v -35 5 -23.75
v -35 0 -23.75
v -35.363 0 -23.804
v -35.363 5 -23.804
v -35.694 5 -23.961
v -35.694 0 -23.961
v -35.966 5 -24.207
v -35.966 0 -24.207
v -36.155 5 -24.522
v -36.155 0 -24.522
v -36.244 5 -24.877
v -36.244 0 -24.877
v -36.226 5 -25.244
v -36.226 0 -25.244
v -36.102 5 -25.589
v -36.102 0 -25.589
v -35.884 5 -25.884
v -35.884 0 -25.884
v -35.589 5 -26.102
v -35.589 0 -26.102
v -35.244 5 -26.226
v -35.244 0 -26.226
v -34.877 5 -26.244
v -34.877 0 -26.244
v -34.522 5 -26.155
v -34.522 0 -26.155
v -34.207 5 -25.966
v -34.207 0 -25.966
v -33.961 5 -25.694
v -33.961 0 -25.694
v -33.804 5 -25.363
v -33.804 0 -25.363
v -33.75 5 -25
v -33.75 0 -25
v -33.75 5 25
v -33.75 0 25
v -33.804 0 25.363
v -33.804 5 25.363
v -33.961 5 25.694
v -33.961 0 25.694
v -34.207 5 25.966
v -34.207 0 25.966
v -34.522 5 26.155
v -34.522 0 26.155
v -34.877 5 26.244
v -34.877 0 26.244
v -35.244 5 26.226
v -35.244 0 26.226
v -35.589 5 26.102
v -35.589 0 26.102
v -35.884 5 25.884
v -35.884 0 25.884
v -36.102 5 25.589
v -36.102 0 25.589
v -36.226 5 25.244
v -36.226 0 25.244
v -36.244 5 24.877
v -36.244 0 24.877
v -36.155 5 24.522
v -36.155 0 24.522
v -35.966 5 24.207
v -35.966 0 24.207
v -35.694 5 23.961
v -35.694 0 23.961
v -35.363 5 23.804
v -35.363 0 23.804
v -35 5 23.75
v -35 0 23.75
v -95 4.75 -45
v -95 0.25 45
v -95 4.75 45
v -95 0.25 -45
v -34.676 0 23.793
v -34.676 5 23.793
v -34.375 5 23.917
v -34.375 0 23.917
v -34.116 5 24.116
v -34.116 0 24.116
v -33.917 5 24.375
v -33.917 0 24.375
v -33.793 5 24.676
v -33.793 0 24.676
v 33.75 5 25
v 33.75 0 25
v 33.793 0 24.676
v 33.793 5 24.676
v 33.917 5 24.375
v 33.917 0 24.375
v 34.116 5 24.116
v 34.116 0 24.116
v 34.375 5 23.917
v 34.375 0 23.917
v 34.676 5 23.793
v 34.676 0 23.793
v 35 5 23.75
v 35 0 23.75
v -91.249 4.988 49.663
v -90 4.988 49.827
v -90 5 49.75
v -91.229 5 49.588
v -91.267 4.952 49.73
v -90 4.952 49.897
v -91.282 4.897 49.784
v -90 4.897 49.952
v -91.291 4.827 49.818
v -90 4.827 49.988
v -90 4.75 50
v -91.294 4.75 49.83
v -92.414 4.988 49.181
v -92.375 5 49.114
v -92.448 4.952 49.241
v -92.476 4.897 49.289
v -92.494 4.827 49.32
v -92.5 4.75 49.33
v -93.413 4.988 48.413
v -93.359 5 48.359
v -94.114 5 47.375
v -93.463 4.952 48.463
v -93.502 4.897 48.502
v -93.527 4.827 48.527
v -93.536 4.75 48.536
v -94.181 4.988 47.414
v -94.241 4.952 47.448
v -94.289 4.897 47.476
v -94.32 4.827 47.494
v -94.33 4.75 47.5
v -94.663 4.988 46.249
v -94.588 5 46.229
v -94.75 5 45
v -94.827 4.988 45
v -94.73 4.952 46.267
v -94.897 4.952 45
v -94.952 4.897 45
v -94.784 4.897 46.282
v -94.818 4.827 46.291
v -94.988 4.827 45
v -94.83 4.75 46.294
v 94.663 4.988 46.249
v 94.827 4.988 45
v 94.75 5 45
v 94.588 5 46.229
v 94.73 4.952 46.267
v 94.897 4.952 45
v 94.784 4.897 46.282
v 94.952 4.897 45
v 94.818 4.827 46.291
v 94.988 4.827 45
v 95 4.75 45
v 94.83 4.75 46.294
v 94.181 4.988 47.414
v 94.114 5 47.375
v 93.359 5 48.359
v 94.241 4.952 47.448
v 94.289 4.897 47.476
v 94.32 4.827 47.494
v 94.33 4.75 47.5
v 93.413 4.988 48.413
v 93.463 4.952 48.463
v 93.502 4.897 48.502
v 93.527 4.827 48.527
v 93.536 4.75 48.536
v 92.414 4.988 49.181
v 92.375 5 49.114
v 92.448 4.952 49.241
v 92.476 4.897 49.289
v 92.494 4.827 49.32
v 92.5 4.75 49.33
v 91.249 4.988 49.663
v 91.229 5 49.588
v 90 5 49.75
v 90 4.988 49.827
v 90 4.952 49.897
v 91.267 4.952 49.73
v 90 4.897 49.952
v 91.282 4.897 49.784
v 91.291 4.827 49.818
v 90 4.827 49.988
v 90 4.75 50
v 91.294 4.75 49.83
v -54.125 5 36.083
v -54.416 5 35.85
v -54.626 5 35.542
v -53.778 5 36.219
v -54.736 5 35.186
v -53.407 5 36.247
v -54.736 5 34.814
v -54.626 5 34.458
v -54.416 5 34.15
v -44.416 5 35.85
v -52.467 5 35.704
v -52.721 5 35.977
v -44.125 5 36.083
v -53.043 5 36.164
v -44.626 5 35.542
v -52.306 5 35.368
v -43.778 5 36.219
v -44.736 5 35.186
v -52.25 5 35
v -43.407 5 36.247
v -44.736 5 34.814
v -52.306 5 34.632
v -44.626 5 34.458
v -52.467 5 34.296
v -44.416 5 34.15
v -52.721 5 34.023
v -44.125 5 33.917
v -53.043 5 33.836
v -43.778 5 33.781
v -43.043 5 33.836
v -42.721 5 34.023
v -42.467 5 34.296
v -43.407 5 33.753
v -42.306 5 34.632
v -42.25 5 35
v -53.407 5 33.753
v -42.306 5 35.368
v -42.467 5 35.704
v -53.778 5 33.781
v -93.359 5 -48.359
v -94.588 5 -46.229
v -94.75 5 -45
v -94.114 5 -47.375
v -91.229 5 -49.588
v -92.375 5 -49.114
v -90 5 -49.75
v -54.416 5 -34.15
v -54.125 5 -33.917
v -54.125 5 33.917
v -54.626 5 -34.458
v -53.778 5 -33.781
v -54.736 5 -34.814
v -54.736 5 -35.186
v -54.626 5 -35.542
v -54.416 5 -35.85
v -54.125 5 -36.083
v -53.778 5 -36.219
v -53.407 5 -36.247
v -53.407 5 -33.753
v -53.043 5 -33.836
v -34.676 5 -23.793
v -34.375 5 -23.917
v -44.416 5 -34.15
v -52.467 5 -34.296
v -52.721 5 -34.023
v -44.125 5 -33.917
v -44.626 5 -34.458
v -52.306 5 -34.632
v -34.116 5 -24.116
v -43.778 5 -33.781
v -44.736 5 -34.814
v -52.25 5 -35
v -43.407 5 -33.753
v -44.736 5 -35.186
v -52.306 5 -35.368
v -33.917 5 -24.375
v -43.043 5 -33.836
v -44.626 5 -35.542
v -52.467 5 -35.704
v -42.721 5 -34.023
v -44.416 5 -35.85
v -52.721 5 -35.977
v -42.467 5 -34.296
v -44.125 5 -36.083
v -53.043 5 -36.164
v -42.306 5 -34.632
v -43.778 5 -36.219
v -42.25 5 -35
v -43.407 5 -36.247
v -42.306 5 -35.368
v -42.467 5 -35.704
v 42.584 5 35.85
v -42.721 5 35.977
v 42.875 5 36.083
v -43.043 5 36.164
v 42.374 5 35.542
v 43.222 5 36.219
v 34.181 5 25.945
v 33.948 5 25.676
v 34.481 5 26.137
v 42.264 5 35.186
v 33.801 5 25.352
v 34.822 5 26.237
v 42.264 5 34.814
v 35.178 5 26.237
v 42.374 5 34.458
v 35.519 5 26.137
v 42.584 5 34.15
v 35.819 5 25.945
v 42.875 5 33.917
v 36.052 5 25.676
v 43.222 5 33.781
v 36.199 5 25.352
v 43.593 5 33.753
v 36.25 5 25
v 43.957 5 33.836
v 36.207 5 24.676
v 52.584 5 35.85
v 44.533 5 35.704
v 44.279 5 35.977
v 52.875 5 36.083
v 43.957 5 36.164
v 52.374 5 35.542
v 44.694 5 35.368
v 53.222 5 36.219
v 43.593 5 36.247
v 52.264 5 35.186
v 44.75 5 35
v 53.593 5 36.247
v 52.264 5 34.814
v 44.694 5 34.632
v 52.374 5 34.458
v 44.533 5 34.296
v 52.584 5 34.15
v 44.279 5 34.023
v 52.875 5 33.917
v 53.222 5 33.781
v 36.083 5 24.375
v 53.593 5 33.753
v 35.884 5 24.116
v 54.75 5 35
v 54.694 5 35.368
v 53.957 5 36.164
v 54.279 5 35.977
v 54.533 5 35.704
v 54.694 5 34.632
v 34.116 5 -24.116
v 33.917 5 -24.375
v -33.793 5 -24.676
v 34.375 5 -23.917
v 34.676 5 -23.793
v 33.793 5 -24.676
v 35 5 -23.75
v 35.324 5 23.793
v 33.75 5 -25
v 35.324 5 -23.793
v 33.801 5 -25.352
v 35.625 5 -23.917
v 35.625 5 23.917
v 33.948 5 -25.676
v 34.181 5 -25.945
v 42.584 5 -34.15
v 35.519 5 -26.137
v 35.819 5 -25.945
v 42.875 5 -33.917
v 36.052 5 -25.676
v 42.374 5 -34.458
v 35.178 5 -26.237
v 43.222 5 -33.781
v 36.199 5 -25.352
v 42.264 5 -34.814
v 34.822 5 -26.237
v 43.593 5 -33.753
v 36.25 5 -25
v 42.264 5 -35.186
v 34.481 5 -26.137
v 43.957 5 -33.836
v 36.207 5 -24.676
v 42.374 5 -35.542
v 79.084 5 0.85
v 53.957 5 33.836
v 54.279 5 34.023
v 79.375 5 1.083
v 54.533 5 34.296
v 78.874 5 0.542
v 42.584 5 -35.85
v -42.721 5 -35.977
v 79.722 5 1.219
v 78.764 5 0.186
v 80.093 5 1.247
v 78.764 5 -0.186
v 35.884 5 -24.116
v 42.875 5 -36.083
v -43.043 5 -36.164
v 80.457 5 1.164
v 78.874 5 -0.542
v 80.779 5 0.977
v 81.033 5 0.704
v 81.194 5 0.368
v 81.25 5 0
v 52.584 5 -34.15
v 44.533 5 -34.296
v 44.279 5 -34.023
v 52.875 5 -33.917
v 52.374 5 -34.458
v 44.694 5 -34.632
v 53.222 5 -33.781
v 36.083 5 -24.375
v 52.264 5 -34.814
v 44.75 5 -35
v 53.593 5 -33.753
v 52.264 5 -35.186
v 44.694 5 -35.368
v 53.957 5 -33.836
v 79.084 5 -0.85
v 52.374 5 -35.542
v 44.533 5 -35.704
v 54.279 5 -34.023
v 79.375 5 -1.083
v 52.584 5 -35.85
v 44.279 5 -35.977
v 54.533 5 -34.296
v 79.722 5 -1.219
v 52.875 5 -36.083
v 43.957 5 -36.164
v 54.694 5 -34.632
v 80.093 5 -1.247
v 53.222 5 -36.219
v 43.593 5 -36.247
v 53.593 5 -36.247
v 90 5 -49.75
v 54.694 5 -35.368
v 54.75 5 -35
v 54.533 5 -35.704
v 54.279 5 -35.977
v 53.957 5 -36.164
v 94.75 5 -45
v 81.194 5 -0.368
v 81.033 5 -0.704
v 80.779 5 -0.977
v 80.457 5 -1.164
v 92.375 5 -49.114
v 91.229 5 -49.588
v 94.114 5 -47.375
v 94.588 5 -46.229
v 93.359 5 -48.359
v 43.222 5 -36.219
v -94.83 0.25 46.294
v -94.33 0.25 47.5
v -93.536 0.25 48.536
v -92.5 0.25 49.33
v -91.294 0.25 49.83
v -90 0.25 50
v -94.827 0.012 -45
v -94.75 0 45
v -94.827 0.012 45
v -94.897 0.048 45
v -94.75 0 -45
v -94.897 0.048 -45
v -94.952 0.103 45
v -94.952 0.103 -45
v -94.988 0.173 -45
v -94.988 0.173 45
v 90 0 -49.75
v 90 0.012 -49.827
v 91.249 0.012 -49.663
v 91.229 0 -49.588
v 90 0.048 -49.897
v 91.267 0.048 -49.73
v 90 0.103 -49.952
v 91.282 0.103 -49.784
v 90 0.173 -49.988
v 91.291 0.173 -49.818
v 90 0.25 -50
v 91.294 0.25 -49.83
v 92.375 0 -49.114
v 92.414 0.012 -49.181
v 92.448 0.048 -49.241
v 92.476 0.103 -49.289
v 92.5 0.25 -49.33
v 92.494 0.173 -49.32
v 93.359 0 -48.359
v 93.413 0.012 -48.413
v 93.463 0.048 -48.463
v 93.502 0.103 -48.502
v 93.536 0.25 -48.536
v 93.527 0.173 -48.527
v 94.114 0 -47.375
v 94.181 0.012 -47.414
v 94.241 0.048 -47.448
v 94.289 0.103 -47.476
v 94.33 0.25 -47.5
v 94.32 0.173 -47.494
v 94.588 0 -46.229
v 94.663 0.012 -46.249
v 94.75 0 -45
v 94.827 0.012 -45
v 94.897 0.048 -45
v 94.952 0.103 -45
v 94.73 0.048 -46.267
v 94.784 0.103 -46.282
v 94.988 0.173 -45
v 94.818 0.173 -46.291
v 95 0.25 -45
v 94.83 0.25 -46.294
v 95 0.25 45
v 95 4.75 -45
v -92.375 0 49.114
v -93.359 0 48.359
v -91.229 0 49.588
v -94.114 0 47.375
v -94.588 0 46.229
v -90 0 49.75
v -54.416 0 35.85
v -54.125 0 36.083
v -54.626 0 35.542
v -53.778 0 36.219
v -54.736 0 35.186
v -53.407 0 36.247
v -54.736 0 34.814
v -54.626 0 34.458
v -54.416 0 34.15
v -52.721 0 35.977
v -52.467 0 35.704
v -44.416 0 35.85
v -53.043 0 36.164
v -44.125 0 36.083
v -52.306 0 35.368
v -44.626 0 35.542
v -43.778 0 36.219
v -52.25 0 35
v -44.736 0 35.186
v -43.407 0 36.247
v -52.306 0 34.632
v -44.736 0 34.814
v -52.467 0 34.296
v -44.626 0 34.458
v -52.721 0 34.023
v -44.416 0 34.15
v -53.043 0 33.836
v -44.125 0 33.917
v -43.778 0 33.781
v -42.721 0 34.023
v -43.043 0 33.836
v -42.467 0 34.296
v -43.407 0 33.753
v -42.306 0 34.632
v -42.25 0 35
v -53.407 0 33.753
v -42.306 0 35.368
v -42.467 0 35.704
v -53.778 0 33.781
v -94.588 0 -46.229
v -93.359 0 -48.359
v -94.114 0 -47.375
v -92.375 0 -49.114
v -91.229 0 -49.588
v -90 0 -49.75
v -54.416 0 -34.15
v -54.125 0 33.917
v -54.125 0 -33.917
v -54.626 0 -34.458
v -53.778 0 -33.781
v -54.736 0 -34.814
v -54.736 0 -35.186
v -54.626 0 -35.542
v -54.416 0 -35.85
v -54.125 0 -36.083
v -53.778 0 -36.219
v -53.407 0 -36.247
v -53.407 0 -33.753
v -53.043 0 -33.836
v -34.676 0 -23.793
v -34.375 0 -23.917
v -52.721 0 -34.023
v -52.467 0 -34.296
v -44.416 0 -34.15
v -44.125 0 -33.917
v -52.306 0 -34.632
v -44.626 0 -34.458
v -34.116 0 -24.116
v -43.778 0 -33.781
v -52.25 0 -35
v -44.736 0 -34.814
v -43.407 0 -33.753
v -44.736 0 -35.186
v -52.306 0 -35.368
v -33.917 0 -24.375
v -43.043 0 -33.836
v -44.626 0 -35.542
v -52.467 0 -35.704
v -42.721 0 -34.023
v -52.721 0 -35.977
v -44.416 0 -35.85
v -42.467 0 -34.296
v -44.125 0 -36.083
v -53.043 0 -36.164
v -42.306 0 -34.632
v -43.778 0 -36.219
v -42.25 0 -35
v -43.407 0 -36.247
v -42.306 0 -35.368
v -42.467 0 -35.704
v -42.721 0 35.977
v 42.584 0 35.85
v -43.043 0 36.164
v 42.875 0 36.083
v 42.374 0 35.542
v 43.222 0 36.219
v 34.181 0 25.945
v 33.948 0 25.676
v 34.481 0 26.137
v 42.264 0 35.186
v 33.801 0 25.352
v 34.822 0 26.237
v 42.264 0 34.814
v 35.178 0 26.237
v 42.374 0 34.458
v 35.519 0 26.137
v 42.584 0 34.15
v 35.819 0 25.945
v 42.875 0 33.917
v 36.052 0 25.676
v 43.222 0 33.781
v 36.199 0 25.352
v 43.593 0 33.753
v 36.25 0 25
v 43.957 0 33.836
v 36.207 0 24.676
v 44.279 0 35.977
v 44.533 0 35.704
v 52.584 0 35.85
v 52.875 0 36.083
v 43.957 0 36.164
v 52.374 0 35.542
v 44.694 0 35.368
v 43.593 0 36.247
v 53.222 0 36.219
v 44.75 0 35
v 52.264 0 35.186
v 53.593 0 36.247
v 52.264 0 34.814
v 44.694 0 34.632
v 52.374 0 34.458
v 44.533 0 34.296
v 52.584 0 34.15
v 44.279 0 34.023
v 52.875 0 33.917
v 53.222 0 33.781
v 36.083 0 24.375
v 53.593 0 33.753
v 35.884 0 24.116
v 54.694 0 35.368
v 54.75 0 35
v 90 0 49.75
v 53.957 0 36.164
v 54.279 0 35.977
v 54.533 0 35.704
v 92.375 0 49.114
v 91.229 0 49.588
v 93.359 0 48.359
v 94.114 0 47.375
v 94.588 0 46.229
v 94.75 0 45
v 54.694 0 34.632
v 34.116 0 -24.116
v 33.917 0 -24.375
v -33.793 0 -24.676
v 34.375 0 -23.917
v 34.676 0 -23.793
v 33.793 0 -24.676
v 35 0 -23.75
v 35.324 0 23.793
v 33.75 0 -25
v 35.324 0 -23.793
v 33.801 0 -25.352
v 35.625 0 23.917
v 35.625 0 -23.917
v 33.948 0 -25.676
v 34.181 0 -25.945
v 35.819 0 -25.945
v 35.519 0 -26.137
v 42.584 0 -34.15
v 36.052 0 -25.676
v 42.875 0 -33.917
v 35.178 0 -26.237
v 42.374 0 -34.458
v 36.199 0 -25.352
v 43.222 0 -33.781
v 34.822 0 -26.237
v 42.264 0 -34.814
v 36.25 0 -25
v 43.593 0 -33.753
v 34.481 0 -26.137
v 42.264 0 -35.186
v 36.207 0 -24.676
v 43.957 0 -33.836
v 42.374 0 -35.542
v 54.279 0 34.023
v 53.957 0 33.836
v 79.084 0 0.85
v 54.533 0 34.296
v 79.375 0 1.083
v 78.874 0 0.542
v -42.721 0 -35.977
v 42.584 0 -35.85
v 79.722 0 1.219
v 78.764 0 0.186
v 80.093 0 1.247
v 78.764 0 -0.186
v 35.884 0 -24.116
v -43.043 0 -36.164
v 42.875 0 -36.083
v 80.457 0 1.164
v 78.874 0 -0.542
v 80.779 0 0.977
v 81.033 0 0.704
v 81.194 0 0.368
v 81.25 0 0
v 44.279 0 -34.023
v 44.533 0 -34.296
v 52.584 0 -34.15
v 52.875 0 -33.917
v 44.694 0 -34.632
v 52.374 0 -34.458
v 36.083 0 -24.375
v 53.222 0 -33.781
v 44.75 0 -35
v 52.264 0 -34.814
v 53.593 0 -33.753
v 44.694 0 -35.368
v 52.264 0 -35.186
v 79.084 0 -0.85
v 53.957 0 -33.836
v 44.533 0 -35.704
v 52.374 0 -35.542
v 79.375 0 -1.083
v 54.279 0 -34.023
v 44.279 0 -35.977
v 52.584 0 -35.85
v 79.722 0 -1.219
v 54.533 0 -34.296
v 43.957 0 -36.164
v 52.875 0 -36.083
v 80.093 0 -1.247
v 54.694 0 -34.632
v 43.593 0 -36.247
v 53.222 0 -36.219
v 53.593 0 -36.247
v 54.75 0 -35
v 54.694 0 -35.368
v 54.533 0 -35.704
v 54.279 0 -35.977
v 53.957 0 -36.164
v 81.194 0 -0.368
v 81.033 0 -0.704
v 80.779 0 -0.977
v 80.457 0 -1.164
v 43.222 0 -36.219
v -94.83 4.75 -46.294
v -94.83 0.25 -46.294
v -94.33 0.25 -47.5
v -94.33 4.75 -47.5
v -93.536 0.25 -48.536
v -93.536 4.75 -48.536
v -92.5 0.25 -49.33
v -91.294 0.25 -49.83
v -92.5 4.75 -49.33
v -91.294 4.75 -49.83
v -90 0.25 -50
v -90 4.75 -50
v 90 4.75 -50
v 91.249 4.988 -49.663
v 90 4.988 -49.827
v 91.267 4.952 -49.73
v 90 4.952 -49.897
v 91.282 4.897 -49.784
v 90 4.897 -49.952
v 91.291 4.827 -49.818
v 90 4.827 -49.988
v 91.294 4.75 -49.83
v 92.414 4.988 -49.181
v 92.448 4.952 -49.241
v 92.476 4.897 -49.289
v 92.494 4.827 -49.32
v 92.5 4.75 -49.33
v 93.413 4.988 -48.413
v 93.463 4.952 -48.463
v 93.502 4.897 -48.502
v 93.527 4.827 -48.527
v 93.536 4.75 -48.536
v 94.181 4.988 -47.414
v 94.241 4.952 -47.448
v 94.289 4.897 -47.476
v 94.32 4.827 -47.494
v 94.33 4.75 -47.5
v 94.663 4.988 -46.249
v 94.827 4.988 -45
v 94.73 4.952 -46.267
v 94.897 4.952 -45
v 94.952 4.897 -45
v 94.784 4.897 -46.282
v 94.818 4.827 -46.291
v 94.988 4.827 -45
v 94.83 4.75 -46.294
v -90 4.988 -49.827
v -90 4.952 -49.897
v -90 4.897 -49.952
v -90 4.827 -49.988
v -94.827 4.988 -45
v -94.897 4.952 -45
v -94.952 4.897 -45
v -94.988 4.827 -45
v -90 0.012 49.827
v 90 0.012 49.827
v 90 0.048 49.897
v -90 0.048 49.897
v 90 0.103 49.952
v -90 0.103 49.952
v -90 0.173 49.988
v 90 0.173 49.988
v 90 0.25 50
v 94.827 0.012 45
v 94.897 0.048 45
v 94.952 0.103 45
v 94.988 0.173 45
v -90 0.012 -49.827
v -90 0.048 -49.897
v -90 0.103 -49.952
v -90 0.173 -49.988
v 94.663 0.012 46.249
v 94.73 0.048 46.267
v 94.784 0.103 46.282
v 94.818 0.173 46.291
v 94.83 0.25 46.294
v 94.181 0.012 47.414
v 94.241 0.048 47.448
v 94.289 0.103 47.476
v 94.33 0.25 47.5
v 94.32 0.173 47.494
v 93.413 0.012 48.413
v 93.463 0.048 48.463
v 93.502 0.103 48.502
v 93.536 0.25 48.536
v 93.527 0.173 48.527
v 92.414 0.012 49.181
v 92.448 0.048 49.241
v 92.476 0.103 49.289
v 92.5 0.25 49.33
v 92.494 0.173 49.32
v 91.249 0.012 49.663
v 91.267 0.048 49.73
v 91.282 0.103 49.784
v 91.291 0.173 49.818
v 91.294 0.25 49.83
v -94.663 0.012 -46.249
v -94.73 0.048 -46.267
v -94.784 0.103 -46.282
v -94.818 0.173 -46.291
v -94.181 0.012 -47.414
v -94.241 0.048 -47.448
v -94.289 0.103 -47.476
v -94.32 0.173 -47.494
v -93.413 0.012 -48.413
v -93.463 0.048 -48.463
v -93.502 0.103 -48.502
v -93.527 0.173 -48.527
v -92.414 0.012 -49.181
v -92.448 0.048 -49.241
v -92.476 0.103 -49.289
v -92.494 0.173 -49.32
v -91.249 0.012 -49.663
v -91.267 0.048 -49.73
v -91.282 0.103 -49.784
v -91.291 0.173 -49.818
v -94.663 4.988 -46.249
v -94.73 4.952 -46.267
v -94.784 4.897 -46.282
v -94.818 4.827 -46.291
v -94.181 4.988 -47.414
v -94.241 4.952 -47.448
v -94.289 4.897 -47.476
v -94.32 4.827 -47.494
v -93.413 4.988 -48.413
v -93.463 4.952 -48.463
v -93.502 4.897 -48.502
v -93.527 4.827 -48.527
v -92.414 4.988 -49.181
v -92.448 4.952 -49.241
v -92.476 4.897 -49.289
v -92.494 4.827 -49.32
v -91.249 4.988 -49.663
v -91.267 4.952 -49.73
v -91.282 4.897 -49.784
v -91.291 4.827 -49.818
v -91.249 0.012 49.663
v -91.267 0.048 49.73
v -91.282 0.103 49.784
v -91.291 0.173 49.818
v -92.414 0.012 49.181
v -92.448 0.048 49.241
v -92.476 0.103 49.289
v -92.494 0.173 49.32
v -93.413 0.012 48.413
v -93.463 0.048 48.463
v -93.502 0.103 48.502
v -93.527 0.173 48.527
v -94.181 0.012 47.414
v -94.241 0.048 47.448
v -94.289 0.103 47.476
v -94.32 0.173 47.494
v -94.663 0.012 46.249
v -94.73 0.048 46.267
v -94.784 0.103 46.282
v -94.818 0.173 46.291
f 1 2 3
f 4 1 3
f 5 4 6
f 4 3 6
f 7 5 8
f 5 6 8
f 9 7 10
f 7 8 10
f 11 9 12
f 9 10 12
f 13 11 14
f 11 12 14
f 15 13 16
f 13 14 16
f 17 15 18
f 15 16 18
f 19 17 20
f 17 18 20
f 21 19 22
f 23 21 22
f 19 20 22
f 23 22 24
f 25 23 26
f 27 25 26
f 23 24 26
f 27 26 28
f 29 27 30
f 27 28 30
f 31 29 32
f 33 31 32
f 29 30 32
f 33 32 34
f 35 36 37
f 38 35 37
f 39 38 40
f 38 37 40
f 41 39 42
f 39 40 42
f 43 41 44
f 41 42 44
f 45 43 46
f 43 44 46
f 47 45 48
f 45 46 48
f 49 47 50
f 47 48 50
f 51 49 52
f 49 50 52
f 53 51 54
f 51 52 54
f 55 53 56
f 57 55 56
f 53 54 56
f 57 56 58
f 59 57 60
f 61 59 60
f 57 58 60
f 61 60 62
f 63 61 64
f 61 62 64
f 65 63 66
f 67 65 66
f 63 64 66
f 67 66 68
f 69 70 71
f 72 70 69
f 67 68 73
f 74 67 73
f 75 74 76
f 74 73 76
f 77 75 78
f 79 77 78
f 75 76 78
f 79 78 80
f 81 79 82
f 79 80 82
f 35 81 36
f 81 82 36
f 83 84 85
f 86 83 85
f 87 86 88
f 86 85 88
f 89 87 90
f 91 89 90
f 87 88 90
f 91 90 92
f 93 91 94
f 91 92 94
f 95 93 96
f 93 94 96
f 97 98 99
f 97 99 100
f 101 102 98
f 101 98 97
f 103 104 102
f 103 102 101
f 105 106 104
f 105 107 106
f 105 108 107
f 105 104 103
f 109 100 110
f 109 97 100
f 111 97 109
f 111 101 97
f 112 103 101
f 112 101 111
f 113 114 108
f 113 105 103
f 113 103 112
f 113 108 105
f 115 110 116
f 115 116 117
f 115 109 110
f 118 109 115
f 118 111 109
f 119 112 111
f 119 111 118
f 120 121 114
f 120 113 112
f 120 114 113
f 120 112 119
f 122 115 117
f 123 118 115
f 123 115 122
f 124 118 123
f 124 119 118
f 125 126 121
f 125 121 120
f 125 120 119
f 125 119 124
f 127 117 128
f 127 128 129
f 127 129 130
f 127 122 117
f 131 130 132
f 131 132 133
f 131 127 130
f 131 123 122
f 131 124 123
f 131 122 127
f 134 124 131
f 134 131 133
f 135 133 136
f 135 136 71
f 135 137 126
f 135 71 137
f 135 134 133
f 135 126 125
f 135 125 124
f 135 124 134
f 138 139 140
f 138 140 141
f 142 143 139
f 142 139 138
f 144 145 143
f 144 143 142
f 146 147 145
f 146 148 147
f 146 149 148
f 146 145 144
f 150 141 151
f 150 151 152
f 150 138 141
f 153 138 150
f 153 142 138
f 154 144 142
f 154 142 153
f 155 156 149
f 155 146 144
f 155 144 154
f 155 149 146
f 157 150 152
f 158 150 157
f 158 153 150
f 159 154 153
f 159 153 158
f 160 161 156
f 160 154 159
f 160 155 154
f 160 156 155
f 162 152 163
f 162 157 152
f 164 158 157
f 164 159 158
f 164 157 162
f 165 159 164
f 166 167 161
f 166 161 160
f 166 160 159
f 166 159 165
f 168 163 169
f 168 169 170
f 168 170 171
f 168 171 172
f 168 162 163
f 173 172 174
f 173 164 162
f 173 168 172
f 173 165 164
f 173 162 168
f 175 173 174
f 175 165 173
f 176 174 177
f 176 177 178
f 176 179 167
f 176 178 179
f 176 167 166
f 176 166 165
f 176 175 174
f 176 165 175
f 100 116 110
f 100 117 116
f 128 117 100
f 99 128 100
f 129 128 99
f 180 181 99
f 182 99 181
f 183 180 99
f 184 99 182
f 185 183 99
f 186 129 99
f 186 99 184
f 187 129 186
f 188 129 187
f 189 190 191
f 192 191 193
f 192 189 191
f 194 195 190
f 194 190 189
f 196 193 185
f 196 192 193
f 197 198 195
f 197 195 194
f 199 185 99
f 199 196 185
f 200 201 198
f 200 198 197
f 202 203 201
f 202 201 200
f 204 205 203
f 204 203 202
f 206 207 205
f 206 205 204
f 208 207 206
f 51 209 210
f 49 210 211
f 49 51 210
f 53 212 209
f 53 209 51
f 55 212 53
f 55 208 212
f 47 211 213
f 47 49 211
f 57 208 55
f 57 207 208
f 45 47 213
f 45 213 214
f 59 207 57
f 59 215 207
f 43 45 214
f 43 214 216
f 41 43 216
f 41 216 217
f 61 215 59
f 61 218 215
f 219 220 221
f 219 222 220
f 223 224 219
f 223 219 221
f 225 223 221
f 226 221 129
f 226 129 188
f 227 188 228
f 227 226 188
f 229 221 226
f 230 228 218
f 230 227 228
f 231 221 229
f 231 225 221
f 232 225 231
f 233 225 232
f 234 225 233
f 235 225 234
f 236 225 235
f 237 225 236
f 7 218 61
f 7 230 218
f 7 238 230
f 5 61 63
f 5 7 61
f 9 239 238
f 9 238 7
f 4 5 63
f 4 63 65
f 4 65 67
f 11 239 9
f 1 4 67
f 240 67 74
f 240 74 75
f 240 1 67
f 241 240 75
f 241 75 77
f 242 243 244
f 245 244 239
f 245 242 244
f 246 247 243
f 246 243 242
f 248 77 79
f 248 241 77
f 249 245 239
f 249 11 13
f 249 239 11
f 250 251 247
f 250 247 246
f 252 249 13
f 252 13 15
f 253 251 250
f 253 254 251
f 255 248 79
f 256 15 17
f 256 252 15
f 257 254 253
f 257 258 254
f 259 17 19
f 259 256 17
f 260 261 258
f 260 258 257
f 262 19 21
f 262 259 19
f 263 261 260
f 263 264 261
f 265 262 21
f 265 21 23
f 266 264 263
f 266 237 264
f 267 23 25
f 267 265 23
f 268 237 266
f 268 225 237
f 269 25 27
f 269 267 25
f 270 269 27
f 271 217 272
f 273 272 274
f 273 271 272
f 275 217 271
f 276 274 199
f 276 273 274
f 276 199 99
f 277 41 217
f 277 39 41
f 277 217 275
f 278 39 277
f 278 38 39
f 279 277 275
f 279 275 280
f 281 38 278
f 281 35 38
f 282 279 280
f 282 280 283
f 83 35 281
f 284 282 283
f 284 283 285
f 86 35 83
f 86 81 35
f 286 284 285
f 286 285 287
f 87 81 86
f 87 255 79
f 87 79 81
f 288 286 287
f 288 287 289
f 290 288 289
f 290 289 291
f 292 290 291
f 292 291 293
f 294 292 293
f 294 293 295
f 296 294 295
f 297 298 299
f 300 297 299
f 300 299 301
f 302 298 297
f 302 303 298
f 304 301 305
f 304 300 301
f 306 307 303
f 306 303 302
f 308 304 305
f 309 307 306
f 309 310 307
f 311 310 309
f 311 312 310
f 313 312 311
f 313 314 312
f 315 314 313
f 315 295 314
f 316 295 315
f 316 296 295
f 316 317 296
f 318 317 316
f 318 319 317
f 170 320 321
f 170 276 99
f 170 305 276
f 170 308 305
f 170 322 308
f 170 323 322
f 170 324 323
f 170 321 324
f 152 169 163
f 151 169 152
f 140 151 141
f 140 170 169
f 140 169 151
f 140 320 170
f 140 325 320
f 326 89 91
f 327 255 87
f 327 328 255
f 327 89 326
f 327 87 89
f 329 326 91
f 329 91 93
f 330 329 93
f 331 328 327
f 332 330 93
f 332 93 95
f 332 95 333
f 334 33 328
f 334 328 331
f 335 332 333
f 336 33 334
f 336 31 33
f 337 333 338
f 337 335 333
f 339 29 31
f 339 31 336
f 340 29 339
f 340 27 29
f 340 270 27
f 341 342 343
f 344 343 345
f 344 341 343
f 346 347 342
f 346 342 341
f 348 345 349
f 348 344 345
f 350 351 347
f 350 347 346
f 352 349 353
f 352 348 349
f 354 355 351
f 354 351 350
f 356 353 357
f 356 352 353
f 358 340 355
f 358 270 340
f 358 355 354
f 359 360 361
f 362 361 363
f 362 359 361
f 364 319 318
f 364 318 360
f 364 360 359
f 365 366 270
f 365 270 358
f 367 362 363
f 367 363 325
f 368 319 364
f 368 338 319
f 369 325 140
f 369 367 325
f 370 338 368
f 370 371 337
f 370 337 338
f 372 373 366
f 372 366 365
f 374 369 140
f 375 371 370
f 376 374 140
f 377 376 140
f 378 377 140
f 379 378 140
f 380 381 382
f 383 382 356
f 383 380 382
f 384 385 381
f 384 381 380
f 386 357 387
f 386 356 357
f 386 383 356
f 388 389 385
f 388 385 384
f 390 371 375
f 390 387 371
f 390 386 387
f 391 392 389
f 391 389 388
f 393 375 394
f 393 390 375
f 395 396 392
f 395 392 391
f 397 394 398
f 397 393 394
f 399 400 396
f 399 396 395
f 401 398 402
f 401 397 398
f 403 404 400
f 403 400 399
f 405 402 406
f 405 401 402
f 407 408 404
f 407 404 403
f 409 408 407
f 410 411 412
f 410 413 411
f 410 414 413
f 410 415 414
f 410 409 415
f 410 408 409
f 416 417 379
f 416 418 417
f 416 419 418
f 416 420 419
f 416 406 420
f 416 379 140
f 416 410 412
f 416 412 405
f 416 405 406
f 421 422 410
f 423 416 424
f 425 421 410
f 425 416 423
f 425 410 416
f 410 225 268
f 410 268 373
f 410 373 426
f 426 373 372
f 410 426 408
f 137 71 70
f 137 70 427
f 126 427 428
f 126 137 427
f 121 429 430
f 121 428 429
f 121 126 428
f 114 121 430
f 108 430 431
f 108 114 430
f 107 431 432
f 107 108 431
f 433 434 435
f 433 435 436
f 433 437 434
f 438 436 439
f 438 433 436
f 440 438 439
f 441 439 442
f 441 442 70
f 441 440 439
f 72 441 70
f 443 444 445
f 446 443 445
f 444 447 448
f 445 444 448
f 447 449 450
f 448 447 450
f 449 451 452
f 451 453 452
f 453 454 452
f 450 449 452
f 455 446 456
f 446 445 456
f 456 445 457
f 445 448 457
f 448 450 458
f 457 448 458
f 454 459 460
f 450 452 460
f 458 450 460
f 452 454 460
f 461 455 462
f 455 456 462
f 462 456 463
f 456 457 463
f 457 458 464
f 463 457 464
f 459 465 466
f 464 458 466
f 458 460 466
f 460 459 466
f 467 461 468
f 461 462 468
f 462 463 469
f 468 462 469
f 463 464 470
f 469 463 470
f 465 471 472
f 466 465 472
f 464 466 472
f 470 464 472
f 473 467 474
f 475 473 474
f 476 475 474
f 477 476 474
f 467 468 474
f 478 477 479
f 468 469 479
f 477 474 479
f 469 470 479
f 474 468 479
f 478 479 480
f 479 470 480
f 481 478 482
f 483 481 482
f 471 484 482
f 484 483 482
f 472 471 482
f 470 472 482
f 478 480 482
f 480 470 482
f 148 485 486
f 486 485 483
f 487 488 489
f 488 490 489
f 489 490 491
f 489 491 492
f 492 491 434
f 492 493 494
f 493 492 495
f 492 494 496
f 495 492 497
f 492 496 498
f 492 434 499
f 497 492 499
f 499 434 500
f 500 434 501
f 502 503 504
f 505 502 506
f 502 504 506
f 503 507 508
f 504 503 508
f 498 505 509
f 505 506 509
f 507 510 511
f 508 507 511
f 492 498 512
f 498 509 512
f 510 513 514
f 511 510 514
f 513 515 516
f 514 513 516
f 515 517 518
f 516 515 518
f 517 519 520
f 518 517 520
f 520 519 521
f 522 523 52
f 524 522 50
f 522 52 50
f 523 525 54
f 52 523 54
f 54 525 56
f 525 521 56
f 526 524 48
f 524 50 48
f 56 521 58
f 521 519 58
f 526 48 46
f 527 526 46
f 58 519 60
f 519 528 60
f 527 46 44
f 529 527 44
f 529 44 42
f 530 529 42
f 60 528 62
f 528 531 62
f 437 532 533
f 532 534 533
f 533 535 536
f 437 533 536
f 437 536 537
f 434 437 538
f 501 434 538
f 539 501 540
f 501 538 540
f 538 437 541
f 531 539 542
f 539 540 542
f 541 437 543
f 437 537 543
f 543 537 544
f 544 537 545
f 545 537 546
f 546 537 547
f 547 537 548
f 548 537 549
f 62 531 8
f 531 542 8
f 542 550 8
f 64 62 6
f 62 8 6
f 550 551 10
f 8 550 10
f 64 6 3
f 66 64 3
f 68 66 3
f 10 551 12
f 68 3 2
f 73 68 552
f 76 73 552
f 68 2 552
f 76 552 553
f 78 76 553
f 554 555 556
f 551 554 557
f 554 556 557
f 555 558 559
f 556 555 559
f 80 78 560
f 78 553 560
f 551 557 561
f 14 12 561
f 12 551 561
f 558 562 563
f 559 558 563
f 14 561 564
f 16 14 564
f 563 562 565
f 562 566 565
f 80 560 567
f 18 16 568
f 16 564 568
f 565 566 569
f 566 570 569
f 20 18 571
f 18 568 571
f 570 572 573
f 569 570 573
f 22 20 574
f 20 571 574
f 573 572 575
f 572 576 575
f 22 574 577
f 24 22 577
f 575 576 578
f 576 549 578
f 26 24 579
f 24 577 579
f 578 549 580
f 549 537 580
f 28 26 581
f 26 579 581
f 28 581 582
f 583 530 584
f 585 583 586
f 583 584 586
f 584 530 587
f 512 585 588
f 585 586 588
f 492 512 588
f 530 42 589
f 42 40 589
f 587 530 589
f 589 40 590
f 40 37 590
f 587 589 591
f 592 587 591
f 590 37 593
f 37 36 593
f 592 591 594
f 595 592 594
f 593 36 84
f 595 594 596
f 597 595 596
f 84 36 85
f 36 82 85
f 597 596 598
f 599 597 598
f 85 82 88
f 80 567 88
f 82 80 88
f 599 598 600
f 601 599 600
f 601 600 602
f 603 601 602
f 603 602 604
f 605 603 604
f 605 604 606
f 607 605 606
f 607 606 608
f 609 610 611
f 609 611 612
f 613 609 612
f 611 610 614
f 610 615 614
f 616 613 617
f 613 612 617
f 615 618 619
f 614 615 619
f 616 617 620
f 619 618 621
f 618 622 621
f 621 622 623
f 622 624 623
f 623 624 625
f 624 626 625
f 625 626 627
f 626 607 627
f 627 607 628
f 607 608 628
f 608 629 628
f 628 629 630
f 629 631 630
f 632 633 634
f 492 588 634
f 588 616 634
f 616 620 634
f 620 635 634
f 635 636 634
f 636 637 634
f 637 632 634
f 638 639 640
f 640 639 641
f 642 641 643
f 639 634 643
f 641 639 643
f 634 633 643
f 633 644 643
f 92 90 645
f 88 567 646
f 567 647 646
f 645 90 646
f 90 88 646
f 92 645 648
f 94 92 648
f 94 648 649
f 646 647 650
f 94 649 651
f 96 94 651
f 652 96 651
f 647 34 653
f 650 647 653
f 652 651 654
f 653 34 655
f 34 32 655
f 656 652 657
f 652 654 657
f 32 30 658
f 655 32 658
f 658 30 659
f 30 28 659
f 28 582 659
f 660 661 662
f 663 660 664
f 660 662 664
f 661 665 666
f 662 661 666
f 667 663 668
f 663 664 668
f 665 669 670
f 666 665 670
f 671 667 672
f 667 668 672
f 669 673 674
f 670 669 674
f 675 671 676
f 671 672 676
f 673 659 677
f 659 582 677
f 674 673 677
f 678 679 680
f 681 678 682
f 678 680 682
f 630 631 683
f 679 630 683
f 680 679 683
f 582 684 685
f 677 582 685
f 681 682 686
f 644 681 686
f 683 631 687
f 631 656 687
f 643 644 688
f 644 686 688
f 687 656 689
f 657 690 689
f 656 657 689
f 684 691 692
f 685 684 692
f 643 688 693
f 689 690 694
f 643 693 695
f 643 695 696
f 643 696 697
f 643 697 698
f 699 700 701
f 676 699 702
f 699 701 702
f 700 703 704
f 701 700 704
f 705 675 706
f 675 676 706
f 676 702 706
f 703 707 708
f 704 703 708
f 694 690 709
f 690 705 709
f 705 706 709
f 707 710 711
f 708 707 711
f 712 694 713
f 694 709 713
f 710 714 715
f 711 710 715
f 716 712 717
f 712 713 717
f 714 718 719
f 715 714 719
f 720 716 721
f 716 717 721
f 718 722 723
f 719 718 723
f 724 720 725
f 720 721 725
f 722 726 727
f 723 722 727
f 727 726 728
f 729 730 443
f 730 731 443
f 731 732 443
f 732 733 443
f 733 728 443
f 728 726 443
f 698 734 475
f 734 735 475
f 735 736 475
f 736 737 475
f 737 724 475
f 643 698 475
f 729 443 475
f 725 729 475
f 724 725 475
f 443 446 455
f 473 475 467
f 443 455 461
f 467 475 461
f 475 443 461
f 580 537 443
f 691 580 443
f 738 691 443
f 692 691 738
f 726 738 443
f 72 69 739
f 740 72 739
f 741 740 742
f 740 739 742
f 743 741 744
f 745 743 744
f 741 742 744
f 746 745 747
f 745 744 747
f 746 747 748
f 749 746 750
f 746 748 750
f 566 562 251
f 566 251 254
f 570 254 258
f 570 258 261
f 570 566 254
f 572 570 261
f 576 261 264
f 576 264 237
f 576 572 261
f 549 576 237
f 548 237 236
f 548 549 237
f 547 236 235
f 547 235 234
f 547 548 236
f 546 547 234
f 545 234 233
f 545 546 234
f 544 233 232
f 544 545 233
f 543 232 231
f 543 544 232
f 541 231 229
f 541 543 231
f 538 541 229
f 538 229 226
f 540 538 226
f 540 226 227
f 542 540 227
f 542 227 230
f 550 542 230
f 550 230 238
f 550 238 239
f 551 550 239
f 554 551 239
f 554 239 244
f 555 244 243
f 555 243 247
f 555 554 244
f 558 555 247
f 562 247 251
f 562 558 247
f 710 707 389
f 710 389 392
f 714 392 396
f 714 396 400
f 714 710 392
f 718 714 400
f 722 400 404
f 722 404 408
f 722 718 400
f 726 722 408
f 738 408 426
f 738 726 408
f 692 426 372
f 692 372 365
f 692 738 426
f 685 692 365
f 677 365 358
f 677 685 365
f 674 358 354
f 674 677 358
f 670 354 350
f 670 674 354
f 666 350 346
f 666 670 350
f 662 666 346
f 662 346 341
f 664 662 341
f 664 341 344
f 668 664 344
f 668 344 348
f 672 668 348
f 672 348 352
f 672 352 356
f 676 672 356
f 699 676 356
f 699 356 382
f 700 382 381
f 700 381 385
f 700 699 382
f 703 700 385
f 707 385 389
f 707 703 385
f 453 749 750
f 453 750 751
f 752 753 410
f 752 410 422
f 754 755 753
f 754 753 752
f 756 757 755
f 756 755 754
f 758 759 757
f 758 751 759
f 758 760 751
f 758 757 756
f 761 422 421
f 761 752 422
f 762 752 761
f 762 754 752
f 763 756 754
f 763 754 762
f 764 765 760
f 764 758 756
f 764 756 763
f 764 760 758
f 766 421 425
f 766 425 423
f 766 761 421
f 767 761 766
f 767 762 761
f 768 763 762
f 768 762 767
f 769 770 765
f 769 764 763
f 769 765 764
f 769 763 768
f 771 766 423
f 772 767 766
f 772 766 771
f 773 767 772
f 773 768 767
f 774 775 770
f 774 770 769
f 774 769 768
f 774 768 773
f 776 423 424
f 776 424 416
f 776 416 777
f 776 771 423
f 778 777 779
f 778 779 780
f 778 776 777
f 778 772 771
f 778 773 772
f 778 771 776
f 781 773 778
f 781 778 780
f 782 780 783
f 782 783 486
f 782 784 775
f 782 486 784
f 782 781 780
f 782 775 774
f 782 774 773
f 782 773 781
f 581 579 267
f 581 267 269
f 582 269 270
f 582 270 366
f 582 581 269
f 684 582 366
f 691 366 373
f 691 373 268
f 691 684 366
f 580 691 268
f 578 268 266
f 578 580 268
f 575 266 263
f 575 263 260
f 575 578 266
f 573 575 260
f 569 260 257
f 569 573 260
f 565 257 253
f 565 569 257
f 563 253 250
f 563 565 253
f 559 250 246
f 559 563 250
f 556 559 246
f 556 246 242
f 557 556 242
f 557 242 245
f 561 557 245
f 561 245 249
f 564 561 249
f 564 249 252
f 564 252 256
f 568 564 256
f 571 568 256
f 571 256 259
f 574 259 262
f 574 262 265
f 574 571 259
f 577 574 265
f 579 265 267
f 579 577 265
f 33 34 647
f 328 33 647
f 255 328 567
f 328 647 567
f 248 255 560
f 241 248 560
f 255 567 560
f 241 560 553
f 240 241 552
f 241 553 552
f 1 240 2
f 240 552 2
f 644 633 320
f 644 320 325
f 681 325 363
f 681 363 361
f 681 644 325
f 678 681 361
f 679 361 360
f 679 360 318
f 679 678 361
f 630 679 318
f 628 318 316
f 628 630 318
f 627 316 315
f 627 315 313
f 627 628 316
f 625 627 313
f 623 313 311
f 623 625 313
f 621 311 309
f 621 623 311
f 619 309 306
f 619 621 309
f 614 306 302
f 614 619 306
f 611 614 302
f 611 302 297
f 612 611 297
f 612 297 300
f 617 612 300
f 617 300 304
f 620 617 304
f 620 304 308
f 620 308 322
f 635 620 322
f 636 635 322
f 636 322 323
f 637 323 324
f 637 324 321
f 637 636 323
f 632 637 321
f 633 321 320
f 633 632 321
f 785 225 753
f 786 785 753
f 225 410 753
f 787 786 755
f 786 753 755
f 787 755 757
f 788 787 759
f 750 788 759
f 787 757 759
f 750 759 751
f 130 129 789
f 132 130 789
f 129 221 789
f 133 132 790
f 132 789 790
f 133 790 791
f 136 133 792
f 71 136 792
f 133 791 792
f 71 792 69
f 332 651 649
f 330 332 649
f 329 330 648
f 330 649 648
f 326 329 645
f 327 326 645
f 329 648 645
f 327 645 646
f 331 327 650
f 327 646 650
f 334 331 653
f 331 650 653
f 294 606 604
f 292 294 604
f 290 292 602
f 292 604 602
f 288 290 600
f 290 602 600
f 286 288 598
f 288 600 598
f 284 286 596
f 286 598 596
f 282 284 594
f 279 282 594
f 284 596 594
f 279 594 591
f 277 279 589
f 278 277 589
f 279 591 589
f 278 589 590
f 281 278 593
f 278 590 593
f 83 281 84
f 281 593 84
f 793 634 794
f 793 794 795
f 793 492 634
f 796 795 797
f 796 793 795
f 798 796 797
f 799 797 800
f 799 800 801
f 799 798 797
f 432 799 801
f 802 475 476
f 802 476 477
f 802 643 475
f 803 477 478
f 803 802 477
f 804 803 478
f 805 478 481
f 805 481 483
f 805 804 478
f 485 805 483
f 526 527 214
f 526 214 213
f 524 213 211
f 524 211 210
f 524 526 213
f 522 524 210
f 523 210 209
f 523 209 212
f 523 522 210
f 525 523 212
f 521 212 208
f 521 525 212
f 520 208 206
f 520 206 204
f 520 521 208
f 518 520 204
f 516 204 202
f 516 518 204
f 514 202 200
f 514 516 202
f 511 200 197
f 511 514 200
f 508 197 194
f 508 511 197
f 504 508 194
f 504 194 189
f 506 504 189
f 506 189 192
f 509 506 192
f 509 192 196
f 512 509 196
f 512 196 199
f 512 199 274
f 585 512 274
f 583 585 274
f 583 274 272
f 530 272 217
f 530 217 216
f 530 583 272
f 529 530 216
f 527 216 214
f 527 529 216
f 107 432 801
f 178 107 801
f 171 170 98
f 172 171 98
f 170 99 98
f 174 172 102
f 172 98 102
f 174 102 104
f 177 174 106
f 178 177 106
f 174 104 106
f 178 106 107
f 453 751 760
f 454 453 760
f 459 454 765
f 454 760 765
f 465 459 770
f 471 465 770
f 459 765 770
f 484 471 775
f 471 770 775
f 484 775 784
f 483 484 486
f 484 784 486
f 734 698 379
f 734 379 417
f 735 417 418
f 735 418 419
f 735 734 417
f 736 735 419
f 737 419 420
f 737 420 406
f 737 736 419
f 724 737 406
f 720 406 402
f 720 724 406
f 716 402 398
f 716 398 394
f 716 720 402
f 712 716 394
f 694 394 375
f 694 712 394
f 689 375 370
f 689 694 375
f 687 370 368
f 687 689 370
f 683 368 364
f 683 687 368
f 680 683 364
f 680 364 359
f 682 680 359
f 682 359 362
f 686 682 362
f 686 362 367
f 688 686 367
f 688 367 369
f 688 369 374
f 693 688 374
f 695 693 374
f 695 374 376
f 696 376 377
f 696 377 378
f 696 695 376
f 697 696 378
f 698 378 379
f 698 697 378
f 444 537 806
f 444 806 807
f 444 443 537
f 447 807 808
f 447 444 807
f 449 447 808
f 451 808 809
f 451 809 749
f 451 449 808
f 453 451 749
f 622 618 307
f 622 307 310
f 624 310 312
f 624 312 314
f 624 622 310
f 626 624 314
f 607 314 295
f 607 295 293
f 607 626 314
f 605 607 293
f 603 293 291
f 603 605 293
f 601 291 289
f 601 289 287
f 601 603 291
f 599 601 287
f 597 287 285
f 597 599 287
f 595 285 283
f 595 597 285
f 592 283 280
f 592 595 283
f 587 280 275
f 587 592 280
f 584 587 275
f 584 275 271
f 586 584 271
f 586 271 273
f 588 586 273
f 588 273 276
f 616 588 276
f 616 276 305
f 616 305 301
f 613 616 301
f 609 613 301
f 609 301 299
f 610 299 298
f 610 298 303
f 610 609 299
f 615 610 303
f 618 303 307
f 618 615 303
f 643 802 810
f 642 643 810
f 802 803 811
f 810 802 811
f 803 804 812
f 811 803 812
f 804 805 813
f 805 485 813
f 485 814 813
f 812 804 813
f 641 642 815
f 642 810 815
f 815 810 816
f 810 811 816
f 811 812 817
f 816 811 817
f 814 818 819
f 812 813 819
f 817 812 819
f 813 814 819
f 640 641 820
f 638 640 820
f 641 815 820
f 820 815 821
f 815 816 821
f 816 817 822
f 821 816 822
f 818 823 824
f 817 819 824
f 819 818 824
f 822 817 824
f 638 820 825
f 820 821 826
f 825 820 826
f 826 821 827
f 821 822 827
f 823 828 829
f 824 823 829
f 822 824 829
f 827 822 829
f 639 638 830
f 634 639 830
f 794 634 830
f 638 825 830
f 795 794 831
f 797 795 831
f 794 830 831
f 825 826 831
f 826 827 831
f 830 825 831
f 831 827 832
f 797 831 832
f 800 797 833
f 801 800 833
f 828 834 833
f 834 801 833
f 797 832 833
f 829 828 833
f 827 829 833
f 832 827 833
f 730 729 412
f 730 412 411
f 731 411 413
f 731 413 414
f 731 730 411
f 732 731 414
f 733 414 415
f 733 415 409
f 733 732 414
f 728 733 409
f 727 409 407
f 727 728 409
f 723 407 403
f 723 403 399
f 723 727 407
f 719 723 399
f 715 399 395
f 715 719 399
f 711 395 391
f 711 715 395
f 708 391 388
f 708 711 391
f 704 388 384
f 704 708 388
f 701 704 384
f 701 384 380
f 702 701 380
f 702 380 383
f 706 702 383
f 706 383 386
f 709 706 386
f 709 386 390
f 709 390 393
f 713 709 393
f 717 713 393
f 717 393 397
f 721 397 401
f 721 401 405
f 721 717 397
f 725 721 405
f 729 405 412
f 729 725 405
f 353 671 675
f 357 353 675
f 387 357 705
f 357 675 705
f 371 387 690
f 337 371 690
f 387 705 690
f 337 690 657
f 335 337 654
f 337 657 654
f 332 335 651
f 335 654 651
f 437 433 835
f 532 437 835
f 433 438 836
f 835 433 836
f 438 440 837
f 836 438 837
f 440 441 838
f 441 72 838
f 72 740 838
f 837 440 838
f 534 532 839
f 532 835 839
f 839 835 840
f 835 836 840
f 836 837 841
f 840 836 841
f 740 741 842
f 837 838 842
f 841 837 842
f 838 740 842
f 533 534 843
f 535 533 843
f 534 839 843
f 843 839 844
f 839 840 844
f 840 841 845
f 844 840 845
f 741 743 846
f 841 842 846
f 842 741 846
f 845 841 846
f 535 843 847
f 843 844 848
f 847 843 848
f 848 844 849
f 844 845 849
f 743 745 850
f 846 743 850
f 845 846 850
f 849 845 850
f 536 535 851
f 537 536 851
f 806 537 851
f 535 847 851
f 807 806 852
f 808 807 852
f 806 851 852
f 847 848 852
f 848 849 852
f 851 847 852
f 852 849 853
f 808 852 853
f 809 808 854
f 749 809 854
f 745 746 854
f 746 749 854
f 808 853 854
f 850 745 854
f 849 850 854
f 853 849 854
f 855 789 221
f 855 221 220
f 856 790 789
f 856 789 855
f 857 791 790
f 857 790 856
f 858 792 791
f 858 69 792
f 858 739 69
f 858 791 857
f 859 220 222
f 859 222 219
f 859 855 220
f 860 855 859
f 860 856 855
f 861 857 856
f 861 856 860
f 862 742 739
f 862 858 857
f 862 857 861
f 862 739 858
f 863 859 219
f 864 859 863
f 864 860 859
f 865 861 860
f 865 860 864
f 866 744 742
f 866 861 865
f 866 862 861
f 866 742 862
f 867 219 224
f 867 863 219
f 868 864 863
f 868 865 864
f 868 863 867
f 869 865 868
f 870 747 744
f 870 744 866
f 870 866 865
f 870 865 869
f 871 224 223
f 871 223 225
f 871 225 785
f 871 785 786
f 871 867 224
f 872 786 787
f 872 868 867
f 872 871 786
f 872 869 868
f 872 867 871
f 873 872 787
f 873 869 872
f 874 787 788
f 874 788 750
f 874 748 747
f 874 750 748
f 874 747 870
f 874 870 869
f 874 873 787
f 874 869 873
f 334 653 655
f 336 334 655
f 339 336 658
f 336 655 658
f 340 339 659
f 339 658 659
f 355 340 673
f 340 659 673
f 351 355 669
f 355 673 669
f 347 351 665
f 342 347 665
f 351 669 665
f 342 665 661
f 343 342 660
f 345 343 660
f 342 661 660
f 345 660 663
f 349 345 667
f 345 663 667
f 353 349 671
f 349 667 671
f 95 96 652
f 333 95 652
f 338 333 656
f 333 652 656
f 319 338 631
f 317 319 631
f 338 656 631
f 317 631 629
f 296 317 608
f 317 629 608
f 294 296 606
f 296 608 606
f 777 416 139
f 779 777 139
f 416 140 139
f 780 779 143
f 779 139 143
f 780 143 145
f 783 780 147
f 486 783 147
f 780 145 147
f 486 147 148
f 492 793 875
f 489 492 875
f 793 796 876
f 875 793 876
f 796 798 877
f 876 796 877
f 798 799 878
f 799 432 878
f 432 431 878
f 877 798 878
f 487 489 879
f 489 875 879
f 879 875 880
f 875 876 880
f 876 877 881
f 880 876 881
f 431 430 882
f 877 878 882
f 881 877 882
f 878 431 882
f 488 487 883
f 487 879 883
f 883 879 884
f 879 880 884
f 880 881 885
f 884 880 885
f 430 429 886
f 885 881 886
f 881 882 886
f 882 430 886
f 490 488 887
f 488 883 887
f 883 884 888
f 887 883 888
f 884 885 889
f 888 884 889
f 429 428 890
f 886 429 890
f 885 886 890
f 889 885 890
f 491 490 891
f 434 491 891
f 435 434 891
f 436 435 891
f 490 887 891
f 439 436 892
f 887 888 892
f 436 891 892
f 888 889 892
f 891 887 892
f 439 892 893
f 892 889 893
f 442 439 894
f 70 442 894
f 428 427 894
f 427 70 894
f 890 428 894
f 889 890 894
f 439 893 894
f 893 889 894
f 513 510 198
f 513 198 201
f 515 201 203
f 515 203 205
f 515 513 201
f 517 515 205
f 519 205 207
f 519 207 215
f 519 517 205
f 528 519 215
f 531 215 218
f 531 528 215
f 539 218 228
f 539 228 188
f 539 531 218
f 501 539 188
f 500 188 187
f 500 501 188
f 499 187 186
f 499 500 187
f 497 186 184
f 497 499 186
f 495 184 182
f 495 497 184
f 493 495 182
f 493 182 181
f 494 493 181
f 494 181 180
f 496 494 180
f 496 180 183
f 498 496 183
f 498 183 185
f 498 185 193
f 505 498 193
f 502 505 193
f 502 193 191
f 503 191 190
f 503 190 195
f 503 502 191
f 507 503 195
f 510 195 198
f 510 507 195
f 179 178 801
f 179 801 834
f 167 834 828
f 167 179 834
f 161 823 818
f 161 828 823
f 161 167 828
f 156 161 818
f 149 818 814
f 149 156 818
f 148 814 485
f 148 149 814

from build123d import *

# Parameters (mm, degrees)
SKETCH1_W           = 190
SKETCH1_H           = 100
SKETCH1_R           = 1.25
BOSS_EXTRUDE1_DEPTH = 5
FILLET1_R           = 5
FILLET2_R           = 0.25
BOSS_EXTRUDE2_DEPTH = 5


with BuildPart() as part:
    # Sketch1 → Boss-Extrude1 (new body)
    with BuildSketch(Plane(origin=(0, 0, 0), x_dir=(1, 0, 0), z_dir=(0, 1, 0))):
        Rectangle(SKETCH1_W, SKETCH1_H)
        with Locations((-53.5, -35)):
            Circle(SKETCH1_R, mode=Mode.SUBTRACT)
        with Locations((-43.5, -35)):
            Circle(SKETCH1_R, mode=Mode.SUBTRACT)
        with Locations((43.5, -35)):
            Circle(SKETCH1_R, mode=Mode.SUBTRACT)
        with Locations((53.5, -35)):
            Circle(SKETCH1_R, mode=Mode.SUBTRACT)
        with BuildLine():
            ThreePointArc((-35, 23.75), (-35.883883476, 25.883883476), (-33.75, 25))
            Line((-33.75, 25), (33.75, 25))
            ThreePointArc((33.75, 25), (35, 26.25), (36.25, 25))
            ThreePointArc((36.25, 25), (35.883883476, 24.116116524), (35, 23.75))
            Line((35, 23.75), (35, -23.75))
            ThreePointArc((35, -23.75), (35.883883476, -24.116116524), (36.25, -25))
            ThreePointArc((36.25, -25), (35, -26.25), (33.75, -25))
            Line((33.75, -25), (-33.75, -25))
            ThreePointArc((-33.75, -25), (-35.883883476, -25.883883476), (-35, -23.75))
            Line((-35, -23.75), (-35, 23.75))
        make_face(mode=Mode.SUBTRACT)
        with Locations((-53.5, 35)):
            Circle(SKETCH1_R, mode=Mode.SUBTRACT)
        with Locations((-43.5, 35)):
            Circle(SKETCH1_R, mode=Mode.SUBTRACT)
        with Locations((80, 0)):
            Circle(SKETCH1_R, mode=Mode.SUBTRACT)
        with Locations((43.5, 35)):
            Circle(SKETCH1_R, mode=Mode.SUBTRACT)
        with Locations((53.5, 35)):
            Circle(SKETCH1_R, mode=Mode.SUBTRACT)
    extrude(amount=BOSS_EXTRUDE1_DEPTH)

    # Fillet1
    fillet1_edges = [part.edges().sort_by_distance(p)[0] for p in [
        (95, 2.5, -50),
        (95, 2.5, 50),
        (-95, 2.5, 50),
        (-95, 2.5, -50),
    ]]
    fillet(fillet1_edges, radius=FILLET1_R)

    # Fillet2
    fillet2_edges = [part.edges().sort_by_distance(p)[0] for p in [
        (0, 0, -50),
        (0, 5, -50),
        (95, 0, 0),
        (0, 0, 50),
        (-95, 0, 0),
        (-93.535533906, 0, 48.535533906),
        (-93.535533906, 0, -48.535533906),
        (93.535533906, 0, 48.535533906),
        (93.535533906, 0, -48.535533906),
        (95, 5, 0),
        (-95, 5, 0),
        (0, 5, 50),
        (-93.535533906, 5, 48.535533906),
        (-93.535533906, 5, -48.535533906),
        (93.535533906, 5, 48.535533906),
        (93.535533906, 5, -48.535533906),
    ]]
    fillet(fillet2_edges, radius=FILLET2_R)

    # Sketch1<4> → Boss-Extrude2 (add)
    with BuildSketch(Plane(origin=(0, 0, 0), x_dir=(1, 0, 0), z_dir=(0, 1, 0))):
        with BuildLine():
            Line((33.75, 25), (-33.75, 25))
            ThreePointArc((-33.75, 25), (-34.116116524, 24.116116524), (-35, 23.75))
            Line((-35, 23.75), (-35, -23.75))
            ThreePointArc((-35, -23.75), (-34.116116524, -24.116116524), (-33.75, -25))
            Line((-33.75, -25), (33.75, -25))
            ThreePointArc((33.75, -25), (34.116116524, -24.116116524), (35, -23.75))
            Line((35, -23.75), (35, 23.75))
            ThreePointArc((35, 23.75), (34.116116524, 24.116116524), (33.75, 25))
        make_face()
    extrude(amount=BOSS_EXTRUDE2_DEPTH)


solid = part.part
